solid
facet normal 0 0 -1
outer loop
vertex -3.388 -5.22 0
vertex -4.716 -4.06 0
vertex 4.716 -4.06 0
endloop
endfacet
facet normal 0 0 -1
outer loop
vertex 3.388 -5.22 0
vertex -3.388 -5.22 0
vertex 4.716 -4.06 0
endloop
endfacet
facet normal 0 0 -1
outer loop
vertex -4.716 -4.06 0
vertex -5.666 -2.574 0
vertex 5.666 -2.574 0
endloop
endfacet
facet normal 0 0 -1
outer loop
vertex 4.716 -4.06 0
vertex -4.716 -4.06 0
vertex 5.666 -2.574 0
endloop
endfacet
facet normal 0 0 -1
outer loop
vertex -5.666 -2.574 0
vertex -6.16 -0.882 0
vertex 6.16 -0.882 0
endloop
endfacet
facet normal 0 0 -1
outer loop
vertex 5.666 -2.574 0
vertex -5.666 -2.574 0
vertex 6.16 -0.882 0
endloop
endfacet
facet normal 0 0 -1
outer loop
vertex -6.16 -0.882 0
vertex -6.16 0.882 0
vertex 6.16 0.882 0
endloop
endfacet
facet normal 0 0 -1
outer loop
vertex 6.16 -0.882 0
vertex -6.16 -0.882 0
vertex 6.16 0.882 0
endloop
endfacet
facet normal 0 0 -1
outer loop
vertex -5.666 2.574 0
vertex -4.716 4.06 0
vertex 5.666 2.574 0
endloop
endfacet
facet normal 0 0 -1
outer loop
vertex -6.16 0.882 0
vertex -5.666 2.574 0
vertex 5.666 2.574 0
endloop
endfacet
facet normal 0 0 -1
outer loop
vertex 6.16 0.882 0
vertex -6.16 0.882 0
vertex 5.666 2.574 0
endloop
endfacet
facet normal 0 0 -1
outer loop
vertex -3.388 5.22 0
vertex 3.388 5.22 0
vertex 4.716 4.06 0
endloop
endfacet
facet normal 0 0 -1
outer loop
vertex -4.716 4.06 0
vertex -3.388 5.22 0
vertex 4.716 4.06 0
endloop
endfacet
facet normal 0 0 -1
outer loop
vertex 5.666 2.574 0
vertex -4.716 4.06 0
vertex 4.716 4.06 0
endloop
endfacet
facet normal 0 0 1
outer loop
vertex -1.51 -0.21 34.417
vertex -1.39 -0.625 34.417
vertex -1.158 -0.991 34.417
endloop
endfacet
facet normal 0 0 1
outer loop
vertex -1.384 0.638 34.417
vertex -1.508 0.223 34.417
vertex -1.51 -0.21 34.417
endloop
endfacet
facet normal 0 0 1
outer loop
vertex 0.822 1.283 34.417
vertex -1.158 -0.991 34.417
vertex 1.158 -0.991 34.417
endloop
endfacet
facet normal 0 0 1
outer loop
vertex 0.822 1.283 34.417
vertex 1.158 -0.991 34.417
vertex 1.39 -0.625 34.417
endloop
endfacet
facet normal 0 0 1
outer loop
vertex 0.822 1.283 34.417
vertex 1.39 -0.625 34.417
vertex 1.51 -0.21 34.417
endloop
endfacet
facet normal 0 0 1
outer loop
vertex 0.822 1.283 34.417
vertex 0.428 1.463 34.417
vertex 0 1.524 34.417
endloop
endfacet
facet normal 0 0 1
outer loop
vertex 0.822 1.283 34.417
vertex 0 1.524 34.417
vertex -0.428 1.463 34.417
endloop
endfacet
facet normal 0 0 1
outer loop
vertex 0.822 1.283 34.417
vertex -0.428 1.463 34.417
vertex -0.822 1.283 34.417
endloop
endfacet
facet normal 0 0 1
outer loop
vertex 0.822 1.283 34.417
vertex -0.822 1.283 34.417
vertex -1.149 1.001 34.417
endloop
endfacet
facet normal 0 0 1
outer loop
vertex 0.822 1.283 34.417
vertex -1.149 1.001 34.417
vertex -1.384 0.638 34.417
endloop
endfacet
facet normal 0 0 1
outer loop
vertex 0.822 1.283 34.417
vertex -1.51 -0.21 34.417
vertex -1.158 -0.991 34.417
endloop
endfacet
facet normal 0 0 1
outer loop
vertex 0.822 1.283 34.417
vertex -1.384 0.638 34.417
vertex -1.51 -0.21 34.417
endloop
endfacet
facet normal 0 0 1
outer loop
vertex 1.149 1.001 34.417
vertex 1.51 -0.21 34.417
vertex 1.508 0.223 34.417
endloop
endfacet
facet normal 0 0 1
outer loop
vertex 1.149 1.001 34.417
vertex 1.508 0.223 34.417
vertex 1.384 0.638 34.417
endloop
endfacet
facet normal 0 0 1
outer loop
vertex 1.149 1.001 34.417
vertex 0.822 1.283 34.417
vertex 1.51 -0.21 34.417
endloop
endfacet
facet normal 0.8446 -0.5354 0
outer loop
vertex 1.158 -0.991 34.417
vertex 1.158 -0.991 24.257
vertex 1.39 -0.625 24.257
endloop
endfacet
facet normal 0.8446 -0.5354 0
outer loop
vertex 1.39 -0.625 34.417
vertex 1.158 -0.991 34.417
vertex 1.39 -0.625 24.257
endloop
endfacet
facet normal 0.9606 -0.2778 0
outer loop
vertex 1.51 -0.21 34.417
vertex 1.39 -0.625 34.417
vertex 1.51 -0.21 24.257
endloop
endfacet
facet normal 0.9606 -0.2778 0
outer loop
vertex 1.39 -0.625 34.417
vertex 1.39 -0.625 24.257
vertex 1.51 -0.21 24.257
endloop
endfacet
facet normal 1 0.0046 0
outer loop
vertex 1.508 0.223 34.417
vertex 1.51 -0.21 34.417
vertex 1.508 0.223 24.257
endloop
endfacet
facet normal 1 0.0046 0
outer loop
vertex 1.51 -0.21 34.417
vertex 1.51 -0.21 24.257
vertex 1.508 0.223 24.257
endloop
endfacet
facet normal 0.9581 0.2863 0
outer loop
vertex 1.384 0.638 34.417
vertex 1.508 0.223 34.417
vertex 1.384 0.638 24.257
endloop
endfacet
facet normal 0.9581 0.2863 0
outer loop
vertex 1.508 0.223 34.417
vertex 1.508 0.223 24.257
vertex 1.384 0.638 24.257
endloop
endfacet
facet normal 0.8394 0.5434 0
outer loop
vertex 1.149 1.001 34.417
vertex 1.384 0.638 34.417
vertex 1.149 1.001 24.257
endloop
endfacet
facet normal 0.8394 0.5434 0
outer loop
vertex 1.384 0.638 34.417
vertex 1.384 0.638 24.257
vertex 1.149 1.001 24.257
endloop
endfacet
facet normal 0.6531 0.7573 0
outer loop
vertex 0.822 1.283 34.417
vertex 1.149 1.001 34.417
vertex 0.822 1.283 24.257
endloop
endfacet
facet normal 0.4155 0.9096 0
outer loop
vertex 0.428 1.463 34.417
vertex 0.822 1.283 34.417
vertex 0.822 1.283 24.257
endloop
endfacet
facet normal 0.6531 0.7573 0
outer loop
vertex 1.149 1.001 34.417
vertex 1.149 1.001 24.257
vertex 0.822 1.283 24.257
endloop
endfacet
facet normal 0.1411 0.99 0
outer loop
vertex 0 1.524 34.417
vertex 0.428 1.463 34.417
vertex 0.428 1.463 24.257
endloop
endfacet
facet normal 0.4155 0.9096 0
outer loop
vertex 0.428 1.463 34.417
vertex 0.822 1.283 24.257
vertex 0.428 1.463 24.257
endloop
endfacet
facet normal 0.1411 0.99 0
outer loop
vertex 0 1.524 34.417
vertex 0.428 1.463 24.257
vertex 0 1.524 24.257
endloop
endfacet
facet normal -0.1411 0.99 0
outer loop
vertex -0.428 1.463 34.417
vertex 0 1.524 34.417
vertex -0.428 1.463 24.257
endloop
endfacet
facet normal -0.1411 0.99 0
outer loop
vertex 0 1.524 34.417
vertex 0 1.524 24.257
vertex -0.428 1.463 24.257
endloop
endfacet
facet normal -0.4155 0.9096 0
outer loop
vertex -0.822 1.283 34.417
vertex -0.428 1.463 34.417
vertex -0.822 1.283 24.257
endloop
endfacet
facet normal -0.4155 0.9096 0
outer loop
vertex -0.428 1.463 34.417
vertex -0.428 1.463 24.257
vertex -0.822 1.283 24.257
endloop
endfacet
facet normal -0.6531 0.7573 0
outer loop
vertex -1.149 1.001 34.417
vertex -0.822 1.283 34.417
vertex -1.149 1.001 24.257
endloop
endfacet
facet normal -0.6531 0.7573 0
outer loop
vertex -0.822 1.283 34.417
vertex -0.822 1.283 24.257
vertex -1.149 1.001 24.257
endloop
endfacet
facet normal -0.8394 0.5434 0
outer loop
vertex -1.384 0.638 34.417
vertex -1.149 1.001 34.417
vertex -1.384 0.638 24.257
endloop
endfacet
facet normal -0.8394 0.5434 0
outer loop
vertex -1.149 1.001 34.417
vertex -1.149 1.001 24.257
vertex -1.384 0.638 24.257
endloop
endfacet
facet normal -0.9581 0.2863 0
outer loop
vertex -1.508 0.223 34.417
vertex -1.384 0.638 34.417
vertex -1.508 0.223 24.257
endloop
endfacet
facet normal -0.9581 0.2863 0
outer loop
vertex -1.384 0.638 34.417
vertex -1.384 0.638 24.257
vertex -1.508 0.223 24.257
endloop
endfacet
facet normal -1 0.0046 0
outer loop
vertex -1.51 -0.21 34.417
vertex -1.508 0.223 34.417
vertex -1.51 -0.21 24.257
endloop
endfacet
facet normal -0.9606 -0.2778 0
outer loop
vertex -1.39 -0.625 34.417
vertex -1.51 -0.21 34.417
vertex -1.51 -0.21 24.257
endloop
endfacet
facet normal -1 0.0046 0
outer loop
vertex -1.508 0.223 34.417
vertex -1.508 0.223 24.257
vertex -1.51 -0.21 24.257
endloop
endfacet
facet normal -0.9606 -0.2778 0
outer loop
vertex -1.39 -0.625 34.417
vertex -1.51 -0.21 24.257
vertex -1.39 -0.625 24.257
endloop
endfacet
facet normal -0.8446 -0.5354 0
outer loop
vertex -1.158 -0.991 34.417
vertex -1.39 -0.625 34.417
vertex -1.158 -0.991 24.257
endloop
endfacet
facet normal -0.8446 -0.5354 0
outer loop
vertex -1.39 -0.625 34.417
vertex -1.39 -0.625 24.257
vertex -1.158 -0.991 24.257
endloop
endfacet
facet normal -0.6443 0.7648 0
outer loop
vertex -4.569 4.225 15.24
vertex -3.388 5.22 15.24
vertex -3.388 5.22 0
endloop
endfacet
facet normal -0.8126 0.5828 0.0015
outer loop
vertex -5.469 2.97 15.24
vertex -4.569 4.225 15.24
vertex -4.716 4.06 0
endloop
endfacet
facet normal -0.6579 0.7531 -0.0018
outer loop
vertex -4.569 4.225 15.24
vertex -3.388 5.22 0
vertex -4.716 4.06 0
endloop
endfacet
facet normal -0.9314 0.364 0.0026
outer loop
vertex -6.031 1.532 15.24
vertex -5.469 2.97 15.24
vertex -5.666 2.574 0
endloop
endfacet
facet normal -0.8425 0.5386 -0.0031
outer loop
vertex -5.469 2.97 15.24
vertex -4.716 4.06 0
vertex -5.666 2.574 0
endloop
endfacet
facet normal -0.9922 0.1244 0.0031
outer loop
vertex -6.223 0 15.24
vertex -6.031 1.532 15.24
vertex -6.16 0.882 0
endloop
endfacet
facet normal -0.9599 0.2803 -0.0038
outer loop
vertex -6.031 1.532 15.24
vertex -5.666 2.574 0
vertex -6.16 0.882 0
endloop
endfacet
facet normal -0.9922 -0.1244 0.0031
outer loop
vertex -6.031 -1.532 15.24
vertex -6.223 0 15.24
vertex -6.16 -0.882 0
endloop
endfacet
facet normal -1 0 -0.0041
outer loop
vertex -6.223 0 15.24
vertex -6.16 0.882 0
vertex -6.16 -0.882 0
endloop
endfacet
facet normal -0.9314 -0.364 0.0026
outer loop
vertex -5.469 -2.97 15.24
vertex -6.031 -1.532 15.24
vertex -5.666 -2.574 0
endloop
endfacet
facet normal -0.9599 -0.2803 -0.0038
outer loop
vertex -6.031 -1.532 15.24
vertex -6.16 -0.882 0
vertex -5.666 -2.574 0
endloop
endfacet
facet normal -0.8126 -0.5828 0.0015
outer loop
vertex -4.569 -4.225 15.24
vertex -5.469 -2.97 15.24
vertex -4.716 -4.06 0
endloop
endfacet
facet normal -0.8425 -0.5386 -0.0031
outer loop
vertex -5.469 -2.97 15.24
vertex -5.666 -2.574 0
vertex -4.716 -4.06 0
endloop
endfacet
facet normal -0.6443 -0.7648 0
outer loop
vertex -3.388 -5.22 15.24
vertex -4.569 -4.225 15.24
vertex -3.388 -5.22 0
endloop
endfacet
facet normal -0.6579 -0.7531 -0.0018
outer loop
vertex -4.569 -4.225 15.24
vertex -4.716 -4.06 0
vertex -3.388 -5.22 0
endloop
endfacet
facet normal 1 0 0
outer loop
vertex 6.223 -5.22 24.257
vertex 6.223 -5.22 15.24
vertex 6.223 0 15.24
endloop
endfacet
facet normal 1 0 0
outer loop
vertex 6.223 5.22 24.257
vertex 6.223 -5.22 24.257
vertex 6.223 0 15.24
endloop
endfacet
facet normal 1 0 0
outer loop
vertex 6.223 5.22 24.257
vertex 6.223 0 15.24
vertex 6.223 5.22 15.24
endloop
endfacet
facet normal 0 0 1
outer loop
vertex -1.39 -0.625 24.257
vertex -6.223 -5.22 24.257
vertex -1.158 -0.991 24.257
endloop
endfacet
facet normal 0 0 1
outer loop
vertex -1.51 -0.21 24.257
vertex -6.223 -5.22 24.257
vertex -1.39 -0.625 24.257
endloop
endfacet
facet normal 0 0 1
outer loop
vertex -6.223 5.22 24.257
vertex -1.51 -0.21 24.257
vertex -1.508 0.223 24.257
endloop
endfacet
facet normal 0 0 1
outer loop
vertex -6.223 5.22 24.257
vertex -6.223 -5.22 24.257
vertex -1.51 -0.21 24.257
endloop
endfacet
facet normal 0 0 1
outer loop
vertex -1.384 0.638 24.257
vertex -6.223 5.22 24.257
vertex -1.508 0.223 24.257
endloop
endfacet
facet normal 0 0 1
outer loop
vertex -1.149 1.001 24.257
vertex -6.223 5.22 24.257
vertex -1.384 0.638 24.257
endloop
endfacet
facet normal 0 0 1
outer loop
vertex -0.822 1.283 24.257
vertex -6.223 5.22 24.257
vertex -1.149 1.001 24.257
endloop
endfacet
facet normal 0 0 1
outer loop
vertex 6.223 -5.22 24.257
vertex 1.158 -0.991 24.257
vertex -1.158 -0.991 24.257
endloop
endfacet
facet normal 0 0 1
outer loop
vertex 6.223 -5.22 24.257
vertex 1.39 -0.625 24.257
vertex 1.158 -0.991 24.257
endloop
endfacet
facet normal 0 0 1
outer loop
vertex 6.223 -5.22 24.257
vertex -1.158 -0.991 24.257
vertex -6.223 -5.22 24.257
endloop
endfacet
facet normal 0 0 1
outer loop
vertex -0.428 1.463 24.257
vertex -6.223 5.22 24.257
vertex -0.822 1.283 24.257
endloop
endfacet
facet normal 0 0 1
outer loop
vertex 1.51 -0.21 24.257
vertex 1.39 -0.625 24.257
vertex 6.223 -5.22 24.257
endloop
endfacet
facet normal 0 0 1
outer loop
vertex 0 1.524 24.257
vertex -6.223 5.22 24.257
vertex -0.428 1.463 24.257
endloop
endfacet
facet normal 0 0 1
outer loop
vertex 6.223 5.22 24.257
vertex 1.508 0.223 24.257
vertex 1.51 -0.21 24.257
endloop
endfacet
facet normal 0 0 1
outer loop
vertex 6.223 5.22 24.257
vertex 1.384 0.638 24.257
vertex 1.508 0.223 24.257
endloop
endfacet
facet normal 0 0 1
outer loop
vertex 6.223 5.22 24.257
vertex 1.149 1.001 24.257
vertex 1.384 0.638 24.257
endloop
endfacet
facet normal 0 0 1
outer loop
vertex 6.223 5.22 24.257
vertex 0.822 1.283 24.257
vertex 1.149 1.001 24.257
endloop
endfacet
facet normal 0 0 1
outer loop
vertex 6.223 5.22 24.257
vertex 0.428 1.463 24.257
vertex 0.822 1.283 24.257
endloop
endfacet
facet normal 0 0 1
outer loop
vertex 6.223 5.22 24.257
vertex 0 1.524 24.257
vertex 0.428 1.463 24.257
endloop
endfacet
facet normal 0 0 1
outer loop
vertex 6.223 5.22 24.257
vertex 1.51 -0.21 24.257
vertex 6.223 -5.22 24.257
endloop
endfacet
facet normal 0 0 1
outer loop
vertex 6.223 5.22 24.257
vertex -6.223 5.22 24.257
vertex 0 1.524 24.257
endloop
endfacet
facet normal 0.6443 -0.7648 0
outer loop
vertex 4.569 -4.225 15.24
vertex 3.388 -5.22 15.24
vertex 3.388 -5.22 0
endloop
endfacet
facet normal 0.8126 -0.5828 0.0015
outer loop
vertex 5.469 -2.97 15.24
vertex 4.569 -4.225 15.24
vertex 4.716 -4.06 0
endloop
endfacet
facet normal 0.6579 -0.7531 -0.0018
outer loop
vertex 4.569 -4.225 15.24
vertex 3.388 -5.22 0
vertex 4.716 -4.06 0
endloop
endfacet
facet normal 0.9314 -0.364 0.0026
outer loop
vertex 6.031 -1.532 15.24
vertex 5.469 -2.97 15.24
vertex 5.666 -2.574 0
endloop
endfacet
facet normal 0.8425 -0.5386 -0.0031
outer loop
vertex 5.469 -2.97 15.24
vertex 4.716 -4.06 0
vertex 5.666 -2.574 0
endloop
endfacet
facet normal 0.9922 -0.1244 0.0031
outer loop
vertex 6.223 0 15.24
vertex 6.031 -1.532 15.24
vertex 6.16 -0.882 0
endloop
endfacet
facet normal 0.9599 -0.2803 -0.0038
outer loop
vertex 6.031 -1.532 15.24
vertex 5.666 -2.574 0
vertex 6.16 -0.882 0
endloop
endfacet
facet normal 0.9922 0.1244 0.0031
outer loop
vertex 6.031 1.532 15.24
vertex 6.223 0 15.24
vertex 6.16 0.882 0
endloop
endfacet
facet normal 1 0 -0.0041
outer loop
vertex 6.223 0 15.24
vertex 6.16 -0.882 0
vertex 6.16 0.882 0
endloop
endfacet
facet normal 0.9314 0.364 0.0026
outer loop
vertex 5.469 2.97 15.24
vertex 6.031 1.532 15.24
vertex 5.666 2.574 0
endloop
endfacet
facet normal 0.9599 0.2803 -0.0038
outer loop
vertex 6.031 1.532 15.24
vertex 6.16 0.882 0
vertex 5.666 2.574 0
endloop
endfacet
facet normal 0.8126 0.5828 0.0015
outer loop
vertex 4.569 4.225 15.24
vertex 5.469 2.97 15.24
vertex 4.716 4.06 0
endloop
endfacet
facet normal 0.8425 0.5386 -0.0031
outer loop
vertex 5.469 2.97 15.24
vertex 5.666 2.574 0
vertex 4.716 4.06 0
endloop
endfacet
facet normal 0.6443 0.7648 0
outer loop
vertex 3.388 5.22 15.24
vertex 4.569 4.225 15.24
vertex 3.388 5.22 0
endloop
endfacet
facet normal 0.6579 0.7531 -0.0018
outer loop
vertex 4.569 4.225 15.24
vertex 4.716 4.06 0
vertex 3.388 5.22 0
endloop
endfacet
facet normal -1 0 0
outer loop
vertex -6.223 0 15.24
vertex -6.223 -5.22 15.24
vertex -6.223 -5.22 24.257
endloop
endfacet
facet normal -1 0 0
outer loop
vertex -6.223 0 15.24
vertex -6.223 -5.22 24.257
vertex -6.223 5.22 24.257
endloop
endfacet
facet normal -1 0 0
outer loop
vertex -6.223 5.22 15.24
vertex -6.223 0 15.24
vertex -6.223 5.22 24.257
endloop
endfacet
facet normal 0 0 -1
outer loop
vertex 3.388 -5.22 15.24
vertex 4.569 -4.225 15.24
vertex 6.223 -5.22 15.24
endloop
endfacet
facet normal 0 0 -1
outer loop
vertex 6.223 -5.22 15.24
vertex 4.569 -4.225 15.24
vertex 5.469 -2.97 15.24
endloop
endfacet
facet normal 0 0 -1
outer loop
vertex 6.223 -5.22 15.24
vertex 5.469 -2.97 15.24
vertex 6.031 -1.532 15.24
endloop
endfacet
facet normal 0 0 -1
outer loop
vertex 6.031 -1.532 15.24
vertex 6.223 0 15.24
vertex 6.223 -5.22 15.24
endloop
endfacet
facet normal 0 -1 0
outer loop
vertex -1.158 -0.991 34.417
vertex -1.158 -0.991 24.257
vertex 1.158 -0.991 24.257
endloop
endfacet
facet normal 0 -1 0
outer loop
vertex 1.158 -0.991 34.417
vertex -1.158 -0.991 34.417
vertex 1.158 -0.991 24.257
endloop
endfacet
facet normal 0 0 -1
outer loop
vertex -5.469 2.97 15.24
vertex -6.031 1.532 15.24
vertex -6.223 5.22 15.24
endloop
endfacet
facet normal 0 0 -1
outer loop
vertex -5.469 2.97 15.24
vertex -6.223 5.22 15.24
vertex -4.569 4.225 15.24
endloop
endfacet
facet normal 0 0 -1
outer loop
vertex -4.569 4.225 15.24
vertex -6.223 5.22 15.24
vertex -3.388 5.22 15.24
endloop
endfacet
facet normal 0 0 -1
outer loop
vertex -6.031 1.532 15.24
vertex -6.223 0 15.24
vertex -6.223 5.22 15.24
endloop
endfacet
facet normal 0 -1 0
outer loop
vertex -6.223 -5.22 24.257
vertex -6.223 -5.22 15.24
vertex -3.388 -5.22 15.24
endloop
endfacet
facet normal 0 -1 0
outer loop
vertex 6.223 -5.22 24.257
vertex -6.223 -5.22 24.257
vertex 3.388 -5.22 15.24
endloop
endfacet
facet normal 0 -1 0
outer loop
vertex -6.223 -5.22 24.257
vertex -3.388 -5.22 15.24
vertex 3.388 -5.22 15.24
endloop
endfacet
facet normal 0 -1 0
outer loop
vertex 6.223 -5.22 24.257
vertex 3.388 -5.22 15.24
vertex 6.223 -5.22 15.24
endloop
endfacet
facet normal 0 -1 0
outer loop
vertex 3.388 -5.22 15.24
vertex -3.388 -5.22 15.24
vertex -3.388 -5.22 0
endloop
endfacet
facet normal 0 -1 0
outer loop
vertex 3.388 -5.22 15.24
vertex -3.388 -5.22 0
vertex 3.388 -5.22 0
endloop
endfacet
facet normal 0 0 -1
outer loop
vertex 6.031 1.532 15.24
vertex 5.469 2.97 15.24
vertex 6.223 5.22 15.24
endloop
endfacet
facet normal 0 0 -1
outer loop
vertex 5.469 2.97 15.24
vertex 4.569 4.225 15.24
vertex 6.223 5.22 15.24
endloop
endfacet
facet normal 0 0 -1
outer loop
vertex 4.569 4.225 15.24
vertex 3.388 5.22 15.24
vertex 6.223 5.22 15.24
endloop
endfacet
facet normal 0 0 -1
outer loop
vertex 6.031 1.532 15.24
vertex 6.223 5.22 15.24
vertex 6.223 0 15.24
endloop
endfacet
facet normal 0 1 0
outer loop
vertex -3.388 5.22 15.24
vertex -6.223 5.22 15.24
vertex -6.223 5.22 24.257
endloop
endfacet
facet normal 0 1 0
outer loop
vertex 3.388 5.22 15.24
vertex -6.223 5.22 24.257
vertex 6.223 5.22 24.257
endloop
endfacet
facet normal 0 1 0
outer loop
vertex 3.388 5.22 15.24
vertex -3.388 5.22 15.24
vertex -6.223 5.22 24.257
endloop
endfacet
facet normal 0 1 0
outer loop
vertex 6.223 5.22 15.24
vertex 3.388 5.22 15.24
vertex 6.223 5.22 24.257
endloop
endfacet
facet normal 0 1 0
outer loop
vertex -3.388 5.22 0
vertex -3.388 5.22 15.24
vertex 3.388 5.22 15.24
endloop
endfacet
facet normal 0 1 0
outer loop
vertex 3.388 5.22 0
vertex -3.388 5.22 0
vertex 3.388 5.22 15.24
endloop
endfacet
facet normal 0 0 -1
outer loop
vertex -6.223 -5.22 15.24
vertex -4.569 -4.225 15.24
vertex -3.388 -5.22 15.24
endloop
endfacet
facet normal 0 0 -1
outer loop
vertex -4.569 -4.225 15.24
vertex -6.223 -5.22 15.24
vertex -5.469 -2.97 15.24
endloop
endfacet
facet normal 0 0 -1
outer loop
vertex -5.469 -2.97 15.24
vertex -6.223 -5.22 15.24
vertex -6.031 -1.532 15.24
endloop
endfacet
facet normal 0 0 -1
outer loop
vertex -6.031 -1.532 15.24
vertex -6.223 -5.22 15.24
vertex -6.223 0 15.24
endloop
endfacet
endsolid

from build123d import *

# Parameters (mm, degrees)
F1_DEPTH = 15.24
F2_W     = 12.446
F2_H     = 10.4394
F3_DEPTH = 9.017
F5_DEPTH = 10.16


with BuildPart() as f1:
    # F0 (on Top) → F1 (new body)
    with BuildSketch(Plane.XY):
        with BuildLine():
            Line((3.388283, 5.2197), (-3.388283, 5.2197))
            ThreePointArc((-3.388283, 5.2197), (-6.223, 0), (-3.388283, -5.2197))
            Line((-3.388283, -5.2197), (3.388283, -5.2197))
            ThreePointArc((3.388283, -5.2197), (6.223, 0), (3.388283, 5.2197))
        make_face()
    extrude(amount=F1_DEPTH)

    # F2 (on face) → F3 (join)
    with BuildSketch(Plane.XY.offset(15.24)):
        Rectangle(F2_W, F2_H)
    extrude(amount=F3_DEPTH)

    # F4 (on face) → F5 (join)
    with BuildSketch(Plane.XY.offset(24.257)):
        with BuildLine():
            Line((-1.15814, -0.9906), (1.15814, -0.9906))
            ThreePointArc((1.15814, -0.9906), (0, 1.524), (-1.15814, -0.9906))
        make_face()
    extrude(amount=F5_DEPTH)


solid = f1.part
